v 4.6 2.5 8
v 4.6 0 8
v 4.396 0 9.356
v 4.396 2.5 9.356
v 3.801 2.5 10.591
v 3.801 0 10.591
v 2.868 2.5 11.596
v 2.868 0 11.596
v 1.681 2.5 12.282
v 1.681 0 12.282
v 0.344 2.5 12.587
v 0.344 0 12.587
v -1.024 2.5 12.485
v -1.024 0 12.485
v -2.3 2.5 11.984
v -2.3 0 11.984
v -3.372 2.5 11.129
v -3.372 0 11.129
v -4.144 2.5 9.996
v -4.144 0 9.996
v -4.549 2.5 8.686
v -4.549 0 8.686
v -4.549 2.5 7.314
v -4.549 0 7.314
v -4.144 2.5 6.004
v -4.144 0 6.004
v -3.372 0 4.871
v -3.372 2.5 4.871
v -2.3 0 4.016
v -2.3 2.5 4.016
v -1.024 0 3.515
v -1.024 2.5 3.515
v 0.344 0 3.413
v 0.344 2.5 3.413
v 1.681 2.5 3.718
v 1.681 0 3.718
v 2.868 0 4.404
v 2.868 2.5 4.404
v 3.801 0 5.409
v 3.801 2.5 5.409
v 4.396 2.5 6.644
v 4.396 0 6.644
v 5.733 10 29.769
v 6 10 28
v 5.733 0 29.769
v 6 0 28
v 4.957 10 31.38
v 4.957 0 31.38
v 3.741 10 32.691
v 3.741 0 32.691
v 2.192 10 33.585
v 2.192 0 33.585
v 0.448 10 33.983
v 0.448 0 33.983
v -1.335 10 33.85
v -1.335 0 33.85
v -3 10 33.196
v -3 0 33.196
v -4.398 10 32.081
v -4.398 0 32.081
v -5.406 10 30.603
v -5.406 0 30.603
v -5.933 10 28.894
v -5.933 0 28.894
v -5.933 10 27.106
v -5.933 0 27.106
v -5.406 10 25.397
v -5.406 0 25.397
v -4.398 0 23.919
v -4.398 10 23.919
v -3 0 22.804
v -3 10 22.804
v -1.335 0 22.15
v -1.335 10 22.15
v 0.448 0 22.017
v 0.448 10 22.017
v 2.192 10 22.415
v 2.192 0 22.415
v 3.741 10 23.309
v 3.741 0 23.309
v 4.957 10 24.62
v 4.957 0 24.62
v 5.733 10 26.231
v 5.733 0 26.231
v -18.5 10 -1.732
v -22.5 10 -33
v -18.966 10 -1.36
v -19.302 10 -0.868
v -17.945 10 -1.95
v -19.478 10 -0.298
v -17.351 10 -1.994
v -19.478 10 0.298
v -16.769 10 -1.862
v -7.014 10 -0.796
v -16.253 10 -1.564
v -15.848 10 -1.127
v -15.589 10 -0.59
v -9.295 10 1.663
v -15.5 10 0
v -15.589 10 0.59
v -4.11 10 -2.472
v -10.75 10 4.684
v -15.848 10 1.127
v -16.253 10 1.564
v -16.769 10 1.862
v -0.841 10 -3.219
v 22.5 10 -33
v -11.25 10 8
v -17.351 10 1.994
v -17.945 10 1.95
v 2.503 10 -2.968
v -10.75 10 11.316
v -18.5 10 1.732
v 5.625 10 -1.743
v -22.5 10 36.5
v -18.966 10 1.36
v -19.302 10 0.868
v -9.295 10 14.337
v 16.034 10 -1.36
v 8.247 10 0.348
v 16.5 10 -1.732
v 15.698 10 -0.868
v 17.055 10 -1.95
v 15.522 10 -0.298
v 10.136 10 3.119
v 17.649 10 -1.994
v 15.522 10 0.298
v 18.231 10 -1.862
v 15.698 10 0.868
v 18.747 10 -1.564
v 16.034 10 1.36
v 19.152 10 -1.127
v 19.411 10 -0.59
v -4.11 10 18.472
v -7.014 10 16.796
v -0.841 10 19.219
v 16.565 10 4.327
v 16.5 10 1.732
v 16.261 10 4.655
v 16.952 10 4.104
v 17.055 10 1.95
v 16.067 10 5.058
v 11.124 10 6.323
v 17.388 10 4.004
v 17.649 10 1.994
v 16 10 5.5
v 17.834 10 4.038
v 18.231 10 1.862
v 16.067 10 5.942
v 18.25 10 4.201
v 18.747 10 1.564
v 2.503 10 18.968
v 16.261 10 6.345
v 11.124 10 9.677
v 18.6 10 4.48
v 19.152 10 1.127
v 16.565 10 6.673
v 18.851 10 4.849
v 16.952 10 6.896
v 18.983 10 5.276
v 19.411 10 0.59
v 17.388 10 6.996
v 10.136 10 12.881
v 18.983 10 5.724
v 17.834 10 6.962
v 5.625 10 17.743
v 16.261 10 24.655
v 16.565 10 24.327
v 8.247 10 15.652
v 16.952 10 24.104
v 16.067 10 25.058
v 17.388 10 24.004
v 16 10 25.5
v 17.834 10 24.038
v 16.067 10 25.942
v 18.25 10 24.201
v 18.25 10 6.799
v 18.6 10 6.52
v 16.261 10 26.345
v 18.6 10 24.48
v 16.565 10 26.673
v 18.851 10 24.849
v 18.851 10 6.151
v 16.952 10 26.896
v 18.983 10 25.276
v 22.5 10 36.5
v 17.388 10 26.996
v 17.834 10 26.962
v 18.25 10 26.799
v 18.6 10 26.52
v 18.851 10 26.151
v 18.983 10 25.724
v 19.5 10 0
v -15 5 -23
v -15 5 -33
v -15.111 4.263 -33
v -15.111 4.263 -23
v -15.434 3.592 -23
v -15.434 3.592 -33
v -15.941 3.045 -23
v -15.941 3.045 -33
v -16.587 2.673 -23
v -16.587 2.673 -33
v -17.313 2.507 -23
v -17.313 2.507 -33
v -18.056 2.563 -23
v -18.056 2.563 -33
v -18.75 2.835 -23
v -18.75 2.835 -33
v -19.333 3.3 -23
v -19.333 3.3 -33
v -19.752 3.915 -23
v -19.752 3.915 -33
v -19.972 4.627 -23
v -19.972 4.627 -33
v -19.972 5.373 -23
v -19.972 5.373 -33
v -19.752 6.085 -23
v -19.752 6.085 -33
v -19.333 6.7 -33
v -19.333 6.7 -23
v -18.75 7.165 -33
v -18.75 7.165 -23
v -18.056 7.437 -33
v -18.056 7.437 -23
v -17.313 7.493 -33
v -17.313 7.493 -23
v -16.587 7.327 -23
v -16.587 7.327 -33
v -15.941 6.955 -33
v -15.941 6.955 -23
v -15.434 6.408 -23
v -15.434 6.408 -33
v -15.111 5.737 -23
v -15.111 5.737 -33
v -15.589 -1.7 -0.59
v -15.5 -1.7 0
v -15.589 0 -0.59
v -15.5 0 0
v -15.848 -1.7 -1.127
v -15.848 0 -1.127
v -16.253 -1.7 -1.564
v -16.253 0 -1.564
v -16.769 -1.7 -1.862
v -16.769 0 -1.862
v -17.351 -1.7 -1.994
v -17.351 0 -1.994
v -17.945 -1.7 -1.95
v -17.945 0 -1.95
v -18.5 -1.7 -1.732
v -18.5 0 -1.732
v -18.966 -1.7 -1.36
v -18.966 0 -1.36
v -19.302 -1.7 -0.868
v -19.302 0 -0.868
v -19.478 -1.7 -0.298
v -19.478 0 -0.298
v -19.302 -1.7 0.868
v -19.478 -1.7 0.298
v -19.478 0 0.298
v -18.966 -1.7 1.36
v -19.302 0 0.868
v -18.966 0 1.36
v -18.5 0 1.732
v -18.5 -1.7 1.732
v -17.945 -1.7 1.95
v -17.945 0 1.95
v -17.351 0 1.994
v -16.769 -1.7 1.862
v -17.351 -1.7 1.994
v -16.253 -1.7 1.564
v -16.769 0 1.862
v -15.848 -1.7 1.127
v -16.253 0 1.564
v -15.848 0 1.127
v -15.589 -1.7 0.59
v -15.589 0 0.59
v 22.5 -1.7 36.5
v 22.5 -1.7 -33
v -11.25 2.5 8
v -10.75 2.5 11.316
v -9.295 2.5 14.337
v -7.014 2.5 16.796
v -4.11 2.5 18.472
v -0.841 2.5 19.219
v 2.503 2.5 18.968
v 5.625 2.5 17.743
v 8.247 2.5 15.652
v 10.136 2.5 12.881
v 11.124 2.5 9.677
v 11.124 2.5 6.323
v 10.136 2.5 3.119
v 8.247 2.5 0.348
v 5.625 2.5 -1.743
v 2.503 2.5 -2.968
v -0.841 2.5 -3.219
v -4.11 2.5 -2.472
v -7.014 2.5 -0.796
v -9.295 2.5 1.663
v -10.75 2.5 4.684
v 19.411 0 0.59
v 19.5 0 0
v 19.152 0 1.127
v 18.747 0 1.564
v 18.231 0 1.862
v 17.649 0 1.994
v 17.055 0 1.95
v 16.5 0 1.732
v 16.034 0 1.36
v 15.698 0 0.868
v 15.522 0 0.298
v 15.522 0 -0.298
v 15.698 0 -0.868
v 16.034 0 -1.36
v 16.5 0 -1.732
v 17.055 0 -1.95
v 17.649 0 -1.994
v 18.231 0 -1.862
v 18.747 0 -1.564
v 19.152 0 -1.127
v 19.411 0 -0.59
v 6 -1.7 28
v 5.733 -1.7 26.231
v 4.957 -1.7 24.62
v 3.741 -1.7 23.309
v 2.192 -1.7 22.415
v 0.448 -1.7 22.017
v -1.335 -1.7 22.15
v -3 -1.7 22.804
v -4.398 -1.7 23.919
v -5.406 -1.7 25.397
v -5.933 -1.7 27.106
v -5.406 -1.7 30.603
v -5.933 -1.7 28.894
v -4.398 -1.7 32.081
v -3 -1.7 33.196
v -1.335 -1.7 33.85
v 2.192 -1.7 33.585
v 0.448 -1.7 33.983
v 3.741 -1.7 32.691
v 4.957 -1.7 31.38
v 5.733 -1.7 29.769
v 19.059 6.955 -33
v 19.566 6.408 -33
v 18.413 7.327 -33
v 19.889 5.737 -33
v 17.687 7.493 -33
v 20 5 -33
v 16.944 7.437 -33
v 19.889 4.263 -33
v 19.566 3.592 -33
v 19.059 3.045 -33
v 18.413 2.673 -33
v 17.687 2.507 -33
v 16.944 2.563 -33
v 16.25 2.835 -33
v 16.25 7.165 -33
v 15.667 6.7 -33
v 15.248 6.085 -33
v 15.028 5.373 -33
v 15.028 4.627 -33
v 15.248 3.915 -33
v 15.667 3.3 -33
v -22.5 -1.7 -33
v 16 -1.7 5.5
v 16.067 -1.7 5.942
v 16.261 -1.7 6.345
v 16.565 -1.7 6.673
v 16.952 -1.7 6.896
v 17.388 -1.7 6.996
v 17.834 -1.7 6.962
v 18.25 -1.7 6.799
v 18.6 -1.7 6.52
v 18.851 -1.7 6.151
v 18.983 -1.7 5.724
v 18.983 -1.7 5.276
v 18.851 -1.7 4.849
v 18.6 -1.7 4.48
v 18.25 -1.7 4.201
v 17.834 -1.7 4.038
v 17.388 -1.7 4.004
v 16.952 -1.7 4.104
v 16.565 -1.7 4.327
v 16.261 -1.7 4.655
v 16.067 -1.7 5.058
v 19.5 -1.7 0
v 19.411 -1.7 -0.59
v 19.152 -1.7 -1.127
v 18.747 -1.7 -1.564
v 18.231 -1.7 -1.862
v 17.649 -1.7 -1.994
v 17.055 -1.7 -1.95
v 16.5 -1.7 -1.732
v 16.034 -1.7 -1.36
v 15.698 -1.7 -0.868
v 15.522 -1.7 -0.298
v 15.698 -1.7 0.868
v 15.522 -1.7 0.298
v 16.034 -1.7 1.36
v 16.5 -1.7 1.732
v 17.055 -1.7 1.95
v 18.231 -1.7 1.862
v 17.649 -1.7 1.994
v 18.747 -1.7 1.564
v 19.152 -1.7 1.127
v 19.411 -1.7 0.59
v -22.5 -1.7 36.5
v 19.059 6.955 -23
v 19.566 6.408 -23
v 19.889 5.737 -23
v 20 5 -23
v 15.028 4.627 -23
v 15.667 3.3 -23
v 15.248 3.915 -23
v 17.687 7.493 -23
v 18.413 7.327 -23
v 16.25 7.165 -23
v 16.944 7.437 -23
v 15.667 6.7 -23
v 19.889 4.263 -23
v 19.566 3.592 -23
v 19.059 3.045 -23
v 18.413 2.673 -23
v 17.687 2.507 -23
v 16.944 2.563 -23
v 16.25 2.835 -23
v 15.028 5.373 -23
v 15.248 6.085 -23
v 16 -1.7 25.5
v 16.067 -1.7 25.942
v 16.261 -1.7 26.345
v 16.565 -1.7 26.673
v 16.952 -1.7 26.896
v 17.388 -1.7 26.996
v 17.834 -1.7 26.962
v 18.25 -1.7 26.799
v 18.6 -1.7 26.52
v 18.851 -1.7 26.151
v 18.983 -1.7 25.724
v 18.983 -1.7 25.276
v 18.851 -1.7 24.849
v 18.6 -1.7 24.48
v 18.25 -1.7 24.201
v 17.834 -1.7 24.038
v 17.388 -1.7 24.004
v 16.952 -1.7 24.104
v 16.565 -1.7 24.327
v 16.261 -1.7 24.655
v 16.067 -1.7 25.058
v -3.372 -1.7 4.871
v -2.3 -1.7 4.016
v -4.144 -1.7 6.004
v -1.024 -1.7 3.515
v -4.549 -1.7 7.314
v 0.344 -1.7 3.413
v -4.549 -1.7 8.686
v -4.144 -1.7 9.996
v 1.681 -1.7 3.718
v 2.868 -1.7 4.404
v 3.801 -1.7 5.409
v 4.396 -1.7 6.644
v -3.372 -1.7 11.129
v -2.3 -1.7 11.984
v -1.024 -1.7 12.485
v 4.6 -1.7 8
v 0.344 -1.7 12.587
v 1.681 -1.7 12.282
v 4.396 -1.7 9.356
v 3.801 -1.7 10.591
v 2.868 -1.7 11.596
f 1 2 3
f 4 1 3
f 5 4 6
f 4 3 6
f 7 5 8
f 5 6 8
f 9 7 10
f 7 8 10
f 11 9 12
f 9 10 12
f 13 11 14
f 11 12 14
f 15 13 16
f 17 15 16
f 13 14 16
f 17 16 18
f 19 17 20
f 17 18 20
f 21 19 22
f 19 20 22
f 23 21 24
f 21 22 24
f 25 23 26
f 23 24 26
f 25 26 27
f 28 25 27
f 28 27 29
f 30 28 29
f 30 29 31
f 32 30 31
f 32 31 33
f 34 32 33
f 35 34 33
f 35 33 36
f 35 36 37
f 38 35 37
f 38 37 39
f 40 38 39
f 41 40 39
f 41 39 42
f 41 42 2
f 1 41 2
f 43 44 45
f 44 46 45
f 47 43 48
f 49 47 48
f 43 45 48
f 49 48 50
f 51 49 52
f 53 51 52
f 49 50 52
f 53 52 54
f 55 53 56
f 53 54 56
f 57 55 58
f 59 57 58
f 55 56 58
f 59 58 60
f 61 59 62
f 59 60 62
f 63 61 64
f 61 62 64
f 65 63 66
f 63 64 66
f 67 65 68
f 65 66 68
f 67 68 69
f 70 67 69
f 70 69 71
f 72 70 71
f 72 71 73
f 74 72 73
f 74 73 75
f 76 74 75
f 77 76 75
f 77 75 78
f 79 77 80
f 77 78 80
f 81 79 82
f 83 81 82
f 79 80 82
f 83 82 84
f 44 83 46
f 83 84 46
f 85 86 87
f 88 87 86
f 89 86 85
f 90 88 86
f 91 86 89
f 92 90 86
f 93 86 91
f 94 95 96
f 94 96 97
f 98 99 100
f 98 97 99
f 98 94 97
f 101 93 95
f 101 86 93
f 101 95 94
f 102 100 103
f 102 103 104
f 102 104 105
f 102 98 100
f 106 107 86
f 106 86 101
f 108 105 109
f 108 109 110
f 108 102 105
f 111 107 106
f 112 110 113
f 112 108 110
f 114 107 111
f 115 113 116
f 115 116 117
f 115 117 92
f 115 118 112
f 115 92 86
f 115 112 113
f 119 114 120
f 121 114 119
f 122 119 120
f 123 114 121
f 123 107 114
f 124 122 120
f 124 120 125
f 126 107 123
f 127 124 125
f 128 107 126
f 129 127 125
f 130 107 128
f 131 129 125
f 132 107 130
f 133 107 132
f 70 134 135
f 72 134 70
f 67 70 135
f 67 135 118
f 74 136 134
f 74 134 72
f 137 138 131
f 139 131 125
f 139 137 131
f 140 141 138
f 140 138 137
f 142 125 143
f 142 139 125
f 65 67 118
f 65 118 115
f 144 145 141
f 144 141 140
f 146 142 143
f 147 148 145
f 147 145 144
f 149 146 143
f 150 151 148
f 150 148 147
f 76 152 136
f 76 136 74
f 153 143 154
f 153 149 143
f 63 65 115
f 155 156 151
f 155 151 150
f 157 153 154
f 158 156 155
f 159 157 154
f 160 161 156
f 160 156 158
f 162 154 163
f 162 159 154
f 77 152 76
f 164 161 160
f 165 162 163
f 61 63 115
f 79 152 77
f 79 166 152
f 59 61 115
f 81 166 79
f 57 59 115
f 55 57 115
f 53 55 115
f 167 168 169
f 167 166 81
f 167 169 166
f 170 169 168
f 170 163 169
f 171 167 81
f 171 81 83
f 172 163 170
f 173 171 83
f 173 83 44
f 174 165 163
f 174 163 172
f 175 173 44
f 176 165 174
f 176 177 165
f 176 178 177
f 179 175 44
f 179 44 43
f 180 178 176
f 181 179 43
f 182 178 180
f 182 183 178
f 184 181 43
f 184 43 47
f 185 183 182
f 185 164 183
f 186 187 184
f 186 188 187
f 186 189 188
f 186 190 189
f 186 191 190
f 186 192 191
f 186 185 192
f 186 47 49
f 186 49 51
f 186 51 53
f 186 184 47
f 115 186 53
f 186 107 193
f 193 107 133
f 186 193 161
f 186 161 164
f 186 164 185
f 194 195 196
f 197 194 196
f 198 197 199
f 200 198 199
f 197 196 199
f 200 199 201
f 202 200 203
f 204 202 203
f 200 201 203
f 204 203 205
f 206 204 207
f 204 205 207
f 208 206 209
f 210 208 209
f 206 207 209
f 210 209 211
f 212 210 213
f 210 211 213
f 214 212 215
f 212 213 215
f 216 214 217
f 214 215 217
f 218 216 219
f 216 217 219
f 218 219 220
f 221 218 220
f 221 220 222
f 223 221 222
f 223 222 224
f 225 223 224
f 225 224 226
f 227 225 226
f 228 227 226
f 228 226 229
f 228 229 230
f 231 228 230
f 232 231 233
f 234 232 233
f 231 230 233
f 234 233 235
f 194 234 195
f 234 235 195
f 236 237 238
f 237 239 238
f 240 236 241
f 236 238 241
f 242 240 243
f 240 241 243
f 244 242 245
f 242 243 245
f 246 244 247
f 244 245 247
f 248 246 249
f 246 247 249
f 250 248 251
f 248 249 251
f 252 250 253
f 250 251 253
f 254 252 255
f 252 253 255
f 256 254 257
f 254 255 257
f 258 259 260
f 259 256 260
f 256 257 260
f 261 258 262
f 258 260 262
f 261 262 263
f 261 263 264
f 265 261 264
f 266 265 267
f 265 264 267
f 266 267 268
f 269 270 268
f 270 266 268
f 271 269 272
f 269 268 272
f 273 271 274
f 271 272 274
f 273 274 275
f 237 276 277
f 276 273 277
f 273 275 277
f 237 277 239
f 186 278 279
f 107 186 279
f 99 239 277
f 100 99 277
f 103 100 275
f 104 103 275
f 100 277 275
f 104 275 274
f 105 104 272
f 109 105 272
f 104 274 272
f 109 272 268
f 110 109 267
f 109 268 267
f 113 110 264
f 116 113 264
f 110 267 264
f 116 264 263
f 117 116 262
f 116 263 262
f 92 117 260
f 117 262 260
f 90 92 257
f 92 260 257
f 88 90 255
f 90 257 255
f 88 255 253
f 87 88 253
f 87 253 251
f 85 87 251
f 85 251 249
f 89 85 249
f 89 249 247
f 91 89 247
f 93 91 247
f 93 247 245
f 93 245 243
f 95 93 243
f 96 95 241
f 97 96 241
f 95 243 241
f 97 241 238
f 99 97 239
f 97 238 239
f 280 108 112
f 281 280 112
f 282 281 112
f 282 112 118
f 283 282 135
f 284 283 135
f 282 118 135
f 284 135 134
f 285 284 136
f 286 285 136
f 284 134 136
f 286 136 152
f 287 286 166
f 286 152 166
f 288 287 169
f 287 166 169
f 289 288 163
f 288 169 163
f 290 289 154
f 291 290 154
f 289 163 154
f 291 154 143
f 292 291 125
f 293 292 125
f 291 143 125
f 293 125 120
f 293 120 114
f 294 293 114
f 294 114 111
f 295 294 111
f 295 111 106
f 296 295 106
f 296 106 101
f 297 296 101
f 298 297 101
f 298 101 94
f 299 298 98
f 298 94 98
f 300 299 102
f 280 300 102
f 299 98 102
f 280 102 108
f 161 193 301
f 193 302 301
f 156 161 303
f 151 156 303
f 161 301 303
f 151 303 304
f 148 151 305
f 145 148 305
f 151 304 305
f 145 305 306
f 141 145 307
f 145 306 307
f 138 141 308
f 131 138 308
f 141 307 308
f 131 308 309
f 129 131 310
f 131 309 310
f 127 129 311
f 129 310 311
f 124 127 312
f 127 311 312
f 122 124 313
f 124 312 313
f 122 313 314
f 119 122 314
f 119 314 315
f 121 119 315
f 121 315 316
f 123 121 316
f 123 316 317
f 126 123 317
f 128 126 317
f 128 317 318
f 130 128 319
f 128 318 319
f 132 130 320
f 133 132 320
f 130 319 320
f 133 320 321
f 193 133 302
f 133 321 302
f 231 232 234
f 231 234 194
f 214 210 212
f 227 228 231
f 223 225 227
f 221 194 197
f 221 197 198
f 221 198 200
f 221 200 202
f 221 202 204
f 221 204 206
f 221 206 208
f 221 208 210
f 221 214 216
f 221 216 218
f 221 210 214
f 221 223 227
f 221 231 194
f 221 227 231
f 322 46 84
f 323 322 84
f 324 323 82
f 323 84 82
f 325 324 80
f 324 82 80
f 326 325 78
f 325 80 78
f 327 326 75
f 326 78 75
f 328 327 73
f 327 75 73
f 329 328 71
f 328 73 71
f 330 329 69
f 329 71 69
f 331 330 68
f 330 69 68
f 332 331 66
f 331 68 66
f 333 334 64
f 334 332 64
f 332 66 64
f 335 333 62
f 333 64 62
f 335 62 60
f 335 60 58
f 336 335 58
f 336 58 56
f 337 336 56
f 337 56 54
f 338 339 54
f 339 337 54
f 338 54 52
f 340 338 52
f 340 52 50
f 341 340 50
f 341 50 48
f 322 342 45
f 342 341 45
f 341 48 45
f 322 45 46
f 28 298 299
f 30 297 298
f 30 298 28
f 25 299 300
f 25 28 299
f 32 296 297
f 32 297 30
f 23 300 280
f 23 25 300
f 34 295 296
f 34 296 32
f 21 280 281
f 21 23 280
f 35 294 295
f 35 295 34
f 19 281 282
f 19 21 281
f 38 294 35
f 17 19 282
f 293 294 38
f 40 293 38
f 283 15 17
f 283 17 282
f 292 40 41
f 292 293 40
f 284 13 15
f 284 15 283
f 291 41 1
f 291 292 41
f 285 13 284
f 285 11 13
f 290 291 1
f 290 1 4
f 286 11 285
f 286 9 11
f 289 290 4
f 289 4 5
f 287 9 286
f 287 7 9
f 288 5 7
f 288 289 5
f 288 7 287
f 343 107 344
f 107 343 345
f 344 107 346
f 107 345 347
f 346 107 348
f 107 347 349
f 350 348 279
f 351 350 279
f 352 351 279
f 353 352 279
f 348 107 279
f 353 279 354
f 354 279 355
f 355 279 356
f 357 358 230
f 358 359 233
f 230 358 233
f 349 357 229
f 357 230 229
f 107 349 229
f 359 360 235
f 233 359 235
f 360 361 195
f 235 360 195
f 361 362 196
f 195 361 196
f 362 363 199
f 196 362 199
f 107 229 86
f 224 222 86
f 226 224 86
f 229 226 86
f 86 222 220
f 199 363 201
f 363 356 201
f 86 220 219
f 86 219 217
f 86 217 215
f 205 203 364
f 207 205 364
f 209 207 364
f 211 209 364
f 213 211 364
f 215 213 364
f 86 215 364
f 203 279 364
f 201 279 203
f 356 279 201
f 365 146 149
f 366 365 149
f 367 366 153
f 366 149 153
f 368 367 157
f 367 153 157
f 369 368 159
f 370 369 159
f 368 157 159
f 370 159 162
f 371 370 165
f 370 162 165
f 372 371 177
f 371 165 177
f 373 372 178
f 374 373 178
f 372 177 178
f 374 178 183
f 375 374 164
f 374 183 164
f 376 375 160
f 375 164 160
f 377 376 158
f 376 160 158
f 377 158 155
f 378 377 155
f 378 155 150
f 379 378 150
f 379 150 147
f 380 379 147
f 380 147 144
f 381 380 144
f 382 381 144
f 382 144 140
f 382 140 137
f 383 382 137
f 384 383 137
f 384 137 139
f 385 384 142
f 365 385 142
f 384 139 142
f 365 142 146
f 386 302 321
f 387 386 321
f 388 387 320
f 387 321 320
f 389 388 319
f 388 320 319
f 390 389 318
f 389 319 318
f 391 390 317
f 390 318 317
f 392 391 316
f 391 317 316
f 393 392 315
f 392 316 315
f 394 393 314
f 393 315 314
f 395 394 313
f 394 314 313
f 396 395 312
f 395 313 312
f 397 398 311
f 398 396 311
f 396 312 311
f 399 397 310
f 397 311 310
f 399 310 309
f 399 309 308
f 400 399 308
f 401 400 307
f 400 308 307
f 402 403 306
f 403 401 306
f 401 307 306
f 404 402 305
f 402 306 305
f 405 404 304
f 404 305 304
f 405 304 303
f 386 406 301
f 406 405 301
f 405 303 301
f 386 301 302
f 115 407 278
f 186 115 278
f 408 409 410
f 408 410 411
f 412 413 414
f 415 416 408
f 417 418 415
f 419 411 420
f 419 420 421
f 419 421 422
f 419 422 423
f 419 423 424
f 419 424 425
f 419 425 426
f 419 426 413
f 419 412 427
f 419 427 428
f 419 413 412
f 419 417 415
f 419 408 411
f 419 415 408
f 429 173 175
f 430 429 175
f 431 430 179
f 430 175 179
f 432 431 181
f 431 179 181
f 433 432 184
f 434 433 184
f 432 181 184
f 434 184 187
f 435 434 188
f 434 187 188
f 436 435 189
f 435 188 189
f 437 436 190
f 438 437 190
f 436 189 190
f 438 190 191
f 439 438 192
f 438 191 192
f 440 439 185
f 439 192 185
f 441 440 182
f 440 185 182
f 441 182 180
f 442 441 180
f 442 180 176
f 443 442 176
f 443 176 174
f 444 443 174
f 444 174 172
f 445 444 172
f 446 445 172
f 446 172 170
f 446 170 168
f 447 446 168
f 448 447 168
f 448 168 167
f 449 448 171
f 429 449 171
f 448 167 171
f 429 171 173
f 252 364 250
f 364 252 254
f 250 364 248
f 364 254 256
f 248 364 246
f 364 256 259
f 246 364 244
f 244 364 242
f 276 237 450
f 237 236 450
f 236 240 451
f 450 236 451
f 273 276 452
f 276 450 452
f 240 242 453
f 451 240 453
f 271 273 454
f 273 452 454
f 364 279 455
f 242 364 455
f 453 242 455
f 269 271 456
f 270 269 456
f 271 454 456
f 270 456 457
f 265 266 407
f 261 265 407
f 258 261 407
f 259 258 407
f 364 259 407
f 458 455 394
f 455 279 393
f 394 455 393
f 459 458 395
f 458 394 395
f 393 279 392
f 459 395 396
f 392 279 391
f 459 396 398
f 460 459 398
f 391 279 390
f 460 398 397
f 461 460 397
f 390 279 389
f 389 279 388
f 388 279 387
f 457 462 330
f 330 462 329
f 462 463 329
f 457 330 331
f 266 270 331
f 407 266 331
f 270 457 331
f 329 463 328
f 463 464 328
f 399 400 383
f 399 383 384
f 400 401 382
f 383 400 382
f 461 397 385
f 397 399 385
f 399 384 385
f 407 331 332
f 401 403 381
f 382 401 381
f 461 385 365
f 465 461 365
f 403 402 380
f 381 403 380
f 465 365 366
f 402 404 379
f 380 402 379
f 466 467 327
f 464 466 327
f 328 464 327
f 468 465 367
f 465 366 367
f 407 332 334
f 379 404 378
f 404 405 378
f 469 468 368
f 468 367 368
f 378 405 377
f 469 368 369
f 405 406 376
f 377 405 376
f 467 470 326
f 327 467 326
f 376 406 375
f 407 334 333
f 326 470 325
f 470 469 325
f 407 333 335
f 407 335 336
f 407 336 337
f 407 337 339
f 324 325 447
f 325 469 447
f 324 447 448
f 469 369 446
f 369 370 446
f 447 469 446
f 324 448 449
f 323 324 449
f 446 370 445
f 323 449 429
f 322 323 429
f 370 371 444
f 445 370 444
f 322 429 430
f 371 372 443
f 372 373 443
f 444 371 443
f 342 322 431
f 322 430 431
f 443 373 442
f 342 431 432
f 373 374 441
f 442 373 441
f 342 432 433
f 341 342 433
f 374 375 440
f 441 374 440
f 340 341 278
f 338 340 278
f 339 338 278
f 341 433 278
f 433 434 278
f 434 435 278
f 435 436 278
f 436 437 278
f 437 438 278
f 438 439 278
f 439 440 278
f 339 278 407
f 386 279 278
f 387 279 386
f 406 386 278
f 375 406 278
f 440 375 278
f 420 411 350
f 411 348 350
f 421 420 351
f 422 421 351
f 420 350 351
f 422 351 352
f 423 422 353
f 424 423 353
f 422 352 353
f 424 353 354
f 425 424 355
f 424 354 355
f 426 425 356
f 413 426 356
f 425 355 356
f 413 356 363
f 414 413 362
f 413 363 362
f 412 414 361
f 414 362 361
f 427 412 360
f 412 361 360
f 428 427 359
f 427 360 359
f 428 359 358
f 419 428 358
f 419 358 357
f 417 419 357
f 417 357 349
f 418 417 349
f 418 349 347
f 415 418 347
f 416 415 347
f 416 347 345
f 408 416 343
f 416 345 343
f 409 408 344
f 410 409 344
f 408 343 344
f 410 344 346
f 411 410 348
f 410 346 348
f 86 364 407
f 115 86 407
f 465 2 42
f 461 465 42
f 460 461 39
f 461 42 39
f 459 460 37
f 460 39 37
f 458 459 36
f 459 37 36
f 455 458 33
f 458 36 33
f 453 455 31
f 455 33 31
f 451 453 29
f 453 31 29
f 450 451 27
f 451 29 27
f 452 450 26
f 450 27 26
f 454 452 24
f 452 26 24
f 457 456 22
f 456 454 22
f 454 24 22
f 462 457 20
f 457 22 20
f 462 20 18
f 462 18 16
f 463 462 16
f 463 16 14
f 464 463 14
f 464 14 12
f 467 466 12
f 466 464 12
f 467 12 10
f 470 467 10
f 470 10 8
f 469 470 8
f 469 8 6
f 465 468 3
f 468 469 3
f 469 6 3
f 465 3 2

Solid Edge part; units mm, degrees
sketch "Sketch1" plane through (0, 0, 0) normal (0, -1, 0) x (1, 0, 0)
  line L0 (22.5, 36.5) -> (22.5, -33)
  line L1 (22.5, -33) -> (-22.5, -33)
  line L2 (-22.5, -33) -> (-22.5, 36.5)
  line L3 (-22.5, 36.5) -> (22.5, 36.5)
  circle A0 centre (0, 28) radius 6
  circle A1 centre (0, 8) radius 4.6
  circle A2 centre (-17.5, 0) radius 2
  circle A3 centre (17.5, 0) radius 2
  dimension "D1" = 35
  dimension "D2" = 17.5
  dimension "D3" = 4
  dimension "D4" = 9.2
  dimension "D5" = 8
  dimension "D6" = 11.2
  dimension "D7" = 5.6
  dimension "D8" = 15
  dimension "D9" = 24
  dimension "D10" = 45
  dimension "D11" = 17
  dimension "D12" = 13.5
  dimension "D13" = 12
  dimension "D14" = 20
extrude "Protrusion1" add sketch "Sketch1" against normal blind 10
sketch "Sketch2" plane through (0, 10, 4.6) normal (0, 1, 0) x (-1, 0, 0)
  circle A0 centre (0, 3.4) radius 11.25
extrude "ExtrudedCutout_1" cut sketch "Sketch2" against normal blind 7.5
sketch "Sketch3" plane through (0, 5, -33) normal (0, 0, -1) x (1, 0, 0)
  circle A0 centre (-17.5, 0) radius 2.5
  circle A1 centre (17.5, 0) radius 2.5
  dimension "D1" = 5
  dimension "D2" = 5
  dimension "D3" = 5
extrude "ExtrudedCutout_2" cut sketch "Sketch3" against normal blind 10
sketch "Sketch4" plane through (0, 0, 0) normal (0, -1, 0) x (1, 0, 0)
  line L0 (-22.5, 36.5) -> (22.5, 36.5)
  line L1 (22.5, 36.5) -> (22.5, -33)
  line L2 (22.5, -33) -> (-22.5, -33)
  line L3 (-22.5, -33) -> (-22.5, 36.5)
  circle A0 centre (0, 8) radius 4.6
  circle A1 centre (0, 28) radius 6
  circle A2 centre (-17.5, 0) radius 2
  circle A3 centre (17.5, 0) radius 2
  dimension "D1" = 35
  dimension "D2" = 17.5
  dimension "D3" = 4
  dimension "D4" = 9.2
  dimension "D5" = 8
  dimension "D6" = 11.2
  dimension "D7" = 5.6
  dimension "D8" = 15
  dimension "D9" = 24
  dimension "D10" = 45
  dimension "D11" = 17
  dimension "D12" = 13.5
  dimension "D13" = 12
  dimension "D14" = 20
extrude "ExtrudedProtrusion_2" add sketch "Sketch4" along normal blind 1.7
sketch "Sketch5" plane through (0, 10, 3.5) normal (0, 1, 0) x (-1, 0, 0)
  circle A0 centre (-17.5, 22) radius 1.5
  circle A1 centre (-17.5, 2) radius 1.5
  dimension "D1" = 3
  dimension "D2" = 20
  dimension "D3" = 5
  dimension "D4" = 5.5
extrude "Cutout1" cut sketch "Sketch5" against normal up to next
